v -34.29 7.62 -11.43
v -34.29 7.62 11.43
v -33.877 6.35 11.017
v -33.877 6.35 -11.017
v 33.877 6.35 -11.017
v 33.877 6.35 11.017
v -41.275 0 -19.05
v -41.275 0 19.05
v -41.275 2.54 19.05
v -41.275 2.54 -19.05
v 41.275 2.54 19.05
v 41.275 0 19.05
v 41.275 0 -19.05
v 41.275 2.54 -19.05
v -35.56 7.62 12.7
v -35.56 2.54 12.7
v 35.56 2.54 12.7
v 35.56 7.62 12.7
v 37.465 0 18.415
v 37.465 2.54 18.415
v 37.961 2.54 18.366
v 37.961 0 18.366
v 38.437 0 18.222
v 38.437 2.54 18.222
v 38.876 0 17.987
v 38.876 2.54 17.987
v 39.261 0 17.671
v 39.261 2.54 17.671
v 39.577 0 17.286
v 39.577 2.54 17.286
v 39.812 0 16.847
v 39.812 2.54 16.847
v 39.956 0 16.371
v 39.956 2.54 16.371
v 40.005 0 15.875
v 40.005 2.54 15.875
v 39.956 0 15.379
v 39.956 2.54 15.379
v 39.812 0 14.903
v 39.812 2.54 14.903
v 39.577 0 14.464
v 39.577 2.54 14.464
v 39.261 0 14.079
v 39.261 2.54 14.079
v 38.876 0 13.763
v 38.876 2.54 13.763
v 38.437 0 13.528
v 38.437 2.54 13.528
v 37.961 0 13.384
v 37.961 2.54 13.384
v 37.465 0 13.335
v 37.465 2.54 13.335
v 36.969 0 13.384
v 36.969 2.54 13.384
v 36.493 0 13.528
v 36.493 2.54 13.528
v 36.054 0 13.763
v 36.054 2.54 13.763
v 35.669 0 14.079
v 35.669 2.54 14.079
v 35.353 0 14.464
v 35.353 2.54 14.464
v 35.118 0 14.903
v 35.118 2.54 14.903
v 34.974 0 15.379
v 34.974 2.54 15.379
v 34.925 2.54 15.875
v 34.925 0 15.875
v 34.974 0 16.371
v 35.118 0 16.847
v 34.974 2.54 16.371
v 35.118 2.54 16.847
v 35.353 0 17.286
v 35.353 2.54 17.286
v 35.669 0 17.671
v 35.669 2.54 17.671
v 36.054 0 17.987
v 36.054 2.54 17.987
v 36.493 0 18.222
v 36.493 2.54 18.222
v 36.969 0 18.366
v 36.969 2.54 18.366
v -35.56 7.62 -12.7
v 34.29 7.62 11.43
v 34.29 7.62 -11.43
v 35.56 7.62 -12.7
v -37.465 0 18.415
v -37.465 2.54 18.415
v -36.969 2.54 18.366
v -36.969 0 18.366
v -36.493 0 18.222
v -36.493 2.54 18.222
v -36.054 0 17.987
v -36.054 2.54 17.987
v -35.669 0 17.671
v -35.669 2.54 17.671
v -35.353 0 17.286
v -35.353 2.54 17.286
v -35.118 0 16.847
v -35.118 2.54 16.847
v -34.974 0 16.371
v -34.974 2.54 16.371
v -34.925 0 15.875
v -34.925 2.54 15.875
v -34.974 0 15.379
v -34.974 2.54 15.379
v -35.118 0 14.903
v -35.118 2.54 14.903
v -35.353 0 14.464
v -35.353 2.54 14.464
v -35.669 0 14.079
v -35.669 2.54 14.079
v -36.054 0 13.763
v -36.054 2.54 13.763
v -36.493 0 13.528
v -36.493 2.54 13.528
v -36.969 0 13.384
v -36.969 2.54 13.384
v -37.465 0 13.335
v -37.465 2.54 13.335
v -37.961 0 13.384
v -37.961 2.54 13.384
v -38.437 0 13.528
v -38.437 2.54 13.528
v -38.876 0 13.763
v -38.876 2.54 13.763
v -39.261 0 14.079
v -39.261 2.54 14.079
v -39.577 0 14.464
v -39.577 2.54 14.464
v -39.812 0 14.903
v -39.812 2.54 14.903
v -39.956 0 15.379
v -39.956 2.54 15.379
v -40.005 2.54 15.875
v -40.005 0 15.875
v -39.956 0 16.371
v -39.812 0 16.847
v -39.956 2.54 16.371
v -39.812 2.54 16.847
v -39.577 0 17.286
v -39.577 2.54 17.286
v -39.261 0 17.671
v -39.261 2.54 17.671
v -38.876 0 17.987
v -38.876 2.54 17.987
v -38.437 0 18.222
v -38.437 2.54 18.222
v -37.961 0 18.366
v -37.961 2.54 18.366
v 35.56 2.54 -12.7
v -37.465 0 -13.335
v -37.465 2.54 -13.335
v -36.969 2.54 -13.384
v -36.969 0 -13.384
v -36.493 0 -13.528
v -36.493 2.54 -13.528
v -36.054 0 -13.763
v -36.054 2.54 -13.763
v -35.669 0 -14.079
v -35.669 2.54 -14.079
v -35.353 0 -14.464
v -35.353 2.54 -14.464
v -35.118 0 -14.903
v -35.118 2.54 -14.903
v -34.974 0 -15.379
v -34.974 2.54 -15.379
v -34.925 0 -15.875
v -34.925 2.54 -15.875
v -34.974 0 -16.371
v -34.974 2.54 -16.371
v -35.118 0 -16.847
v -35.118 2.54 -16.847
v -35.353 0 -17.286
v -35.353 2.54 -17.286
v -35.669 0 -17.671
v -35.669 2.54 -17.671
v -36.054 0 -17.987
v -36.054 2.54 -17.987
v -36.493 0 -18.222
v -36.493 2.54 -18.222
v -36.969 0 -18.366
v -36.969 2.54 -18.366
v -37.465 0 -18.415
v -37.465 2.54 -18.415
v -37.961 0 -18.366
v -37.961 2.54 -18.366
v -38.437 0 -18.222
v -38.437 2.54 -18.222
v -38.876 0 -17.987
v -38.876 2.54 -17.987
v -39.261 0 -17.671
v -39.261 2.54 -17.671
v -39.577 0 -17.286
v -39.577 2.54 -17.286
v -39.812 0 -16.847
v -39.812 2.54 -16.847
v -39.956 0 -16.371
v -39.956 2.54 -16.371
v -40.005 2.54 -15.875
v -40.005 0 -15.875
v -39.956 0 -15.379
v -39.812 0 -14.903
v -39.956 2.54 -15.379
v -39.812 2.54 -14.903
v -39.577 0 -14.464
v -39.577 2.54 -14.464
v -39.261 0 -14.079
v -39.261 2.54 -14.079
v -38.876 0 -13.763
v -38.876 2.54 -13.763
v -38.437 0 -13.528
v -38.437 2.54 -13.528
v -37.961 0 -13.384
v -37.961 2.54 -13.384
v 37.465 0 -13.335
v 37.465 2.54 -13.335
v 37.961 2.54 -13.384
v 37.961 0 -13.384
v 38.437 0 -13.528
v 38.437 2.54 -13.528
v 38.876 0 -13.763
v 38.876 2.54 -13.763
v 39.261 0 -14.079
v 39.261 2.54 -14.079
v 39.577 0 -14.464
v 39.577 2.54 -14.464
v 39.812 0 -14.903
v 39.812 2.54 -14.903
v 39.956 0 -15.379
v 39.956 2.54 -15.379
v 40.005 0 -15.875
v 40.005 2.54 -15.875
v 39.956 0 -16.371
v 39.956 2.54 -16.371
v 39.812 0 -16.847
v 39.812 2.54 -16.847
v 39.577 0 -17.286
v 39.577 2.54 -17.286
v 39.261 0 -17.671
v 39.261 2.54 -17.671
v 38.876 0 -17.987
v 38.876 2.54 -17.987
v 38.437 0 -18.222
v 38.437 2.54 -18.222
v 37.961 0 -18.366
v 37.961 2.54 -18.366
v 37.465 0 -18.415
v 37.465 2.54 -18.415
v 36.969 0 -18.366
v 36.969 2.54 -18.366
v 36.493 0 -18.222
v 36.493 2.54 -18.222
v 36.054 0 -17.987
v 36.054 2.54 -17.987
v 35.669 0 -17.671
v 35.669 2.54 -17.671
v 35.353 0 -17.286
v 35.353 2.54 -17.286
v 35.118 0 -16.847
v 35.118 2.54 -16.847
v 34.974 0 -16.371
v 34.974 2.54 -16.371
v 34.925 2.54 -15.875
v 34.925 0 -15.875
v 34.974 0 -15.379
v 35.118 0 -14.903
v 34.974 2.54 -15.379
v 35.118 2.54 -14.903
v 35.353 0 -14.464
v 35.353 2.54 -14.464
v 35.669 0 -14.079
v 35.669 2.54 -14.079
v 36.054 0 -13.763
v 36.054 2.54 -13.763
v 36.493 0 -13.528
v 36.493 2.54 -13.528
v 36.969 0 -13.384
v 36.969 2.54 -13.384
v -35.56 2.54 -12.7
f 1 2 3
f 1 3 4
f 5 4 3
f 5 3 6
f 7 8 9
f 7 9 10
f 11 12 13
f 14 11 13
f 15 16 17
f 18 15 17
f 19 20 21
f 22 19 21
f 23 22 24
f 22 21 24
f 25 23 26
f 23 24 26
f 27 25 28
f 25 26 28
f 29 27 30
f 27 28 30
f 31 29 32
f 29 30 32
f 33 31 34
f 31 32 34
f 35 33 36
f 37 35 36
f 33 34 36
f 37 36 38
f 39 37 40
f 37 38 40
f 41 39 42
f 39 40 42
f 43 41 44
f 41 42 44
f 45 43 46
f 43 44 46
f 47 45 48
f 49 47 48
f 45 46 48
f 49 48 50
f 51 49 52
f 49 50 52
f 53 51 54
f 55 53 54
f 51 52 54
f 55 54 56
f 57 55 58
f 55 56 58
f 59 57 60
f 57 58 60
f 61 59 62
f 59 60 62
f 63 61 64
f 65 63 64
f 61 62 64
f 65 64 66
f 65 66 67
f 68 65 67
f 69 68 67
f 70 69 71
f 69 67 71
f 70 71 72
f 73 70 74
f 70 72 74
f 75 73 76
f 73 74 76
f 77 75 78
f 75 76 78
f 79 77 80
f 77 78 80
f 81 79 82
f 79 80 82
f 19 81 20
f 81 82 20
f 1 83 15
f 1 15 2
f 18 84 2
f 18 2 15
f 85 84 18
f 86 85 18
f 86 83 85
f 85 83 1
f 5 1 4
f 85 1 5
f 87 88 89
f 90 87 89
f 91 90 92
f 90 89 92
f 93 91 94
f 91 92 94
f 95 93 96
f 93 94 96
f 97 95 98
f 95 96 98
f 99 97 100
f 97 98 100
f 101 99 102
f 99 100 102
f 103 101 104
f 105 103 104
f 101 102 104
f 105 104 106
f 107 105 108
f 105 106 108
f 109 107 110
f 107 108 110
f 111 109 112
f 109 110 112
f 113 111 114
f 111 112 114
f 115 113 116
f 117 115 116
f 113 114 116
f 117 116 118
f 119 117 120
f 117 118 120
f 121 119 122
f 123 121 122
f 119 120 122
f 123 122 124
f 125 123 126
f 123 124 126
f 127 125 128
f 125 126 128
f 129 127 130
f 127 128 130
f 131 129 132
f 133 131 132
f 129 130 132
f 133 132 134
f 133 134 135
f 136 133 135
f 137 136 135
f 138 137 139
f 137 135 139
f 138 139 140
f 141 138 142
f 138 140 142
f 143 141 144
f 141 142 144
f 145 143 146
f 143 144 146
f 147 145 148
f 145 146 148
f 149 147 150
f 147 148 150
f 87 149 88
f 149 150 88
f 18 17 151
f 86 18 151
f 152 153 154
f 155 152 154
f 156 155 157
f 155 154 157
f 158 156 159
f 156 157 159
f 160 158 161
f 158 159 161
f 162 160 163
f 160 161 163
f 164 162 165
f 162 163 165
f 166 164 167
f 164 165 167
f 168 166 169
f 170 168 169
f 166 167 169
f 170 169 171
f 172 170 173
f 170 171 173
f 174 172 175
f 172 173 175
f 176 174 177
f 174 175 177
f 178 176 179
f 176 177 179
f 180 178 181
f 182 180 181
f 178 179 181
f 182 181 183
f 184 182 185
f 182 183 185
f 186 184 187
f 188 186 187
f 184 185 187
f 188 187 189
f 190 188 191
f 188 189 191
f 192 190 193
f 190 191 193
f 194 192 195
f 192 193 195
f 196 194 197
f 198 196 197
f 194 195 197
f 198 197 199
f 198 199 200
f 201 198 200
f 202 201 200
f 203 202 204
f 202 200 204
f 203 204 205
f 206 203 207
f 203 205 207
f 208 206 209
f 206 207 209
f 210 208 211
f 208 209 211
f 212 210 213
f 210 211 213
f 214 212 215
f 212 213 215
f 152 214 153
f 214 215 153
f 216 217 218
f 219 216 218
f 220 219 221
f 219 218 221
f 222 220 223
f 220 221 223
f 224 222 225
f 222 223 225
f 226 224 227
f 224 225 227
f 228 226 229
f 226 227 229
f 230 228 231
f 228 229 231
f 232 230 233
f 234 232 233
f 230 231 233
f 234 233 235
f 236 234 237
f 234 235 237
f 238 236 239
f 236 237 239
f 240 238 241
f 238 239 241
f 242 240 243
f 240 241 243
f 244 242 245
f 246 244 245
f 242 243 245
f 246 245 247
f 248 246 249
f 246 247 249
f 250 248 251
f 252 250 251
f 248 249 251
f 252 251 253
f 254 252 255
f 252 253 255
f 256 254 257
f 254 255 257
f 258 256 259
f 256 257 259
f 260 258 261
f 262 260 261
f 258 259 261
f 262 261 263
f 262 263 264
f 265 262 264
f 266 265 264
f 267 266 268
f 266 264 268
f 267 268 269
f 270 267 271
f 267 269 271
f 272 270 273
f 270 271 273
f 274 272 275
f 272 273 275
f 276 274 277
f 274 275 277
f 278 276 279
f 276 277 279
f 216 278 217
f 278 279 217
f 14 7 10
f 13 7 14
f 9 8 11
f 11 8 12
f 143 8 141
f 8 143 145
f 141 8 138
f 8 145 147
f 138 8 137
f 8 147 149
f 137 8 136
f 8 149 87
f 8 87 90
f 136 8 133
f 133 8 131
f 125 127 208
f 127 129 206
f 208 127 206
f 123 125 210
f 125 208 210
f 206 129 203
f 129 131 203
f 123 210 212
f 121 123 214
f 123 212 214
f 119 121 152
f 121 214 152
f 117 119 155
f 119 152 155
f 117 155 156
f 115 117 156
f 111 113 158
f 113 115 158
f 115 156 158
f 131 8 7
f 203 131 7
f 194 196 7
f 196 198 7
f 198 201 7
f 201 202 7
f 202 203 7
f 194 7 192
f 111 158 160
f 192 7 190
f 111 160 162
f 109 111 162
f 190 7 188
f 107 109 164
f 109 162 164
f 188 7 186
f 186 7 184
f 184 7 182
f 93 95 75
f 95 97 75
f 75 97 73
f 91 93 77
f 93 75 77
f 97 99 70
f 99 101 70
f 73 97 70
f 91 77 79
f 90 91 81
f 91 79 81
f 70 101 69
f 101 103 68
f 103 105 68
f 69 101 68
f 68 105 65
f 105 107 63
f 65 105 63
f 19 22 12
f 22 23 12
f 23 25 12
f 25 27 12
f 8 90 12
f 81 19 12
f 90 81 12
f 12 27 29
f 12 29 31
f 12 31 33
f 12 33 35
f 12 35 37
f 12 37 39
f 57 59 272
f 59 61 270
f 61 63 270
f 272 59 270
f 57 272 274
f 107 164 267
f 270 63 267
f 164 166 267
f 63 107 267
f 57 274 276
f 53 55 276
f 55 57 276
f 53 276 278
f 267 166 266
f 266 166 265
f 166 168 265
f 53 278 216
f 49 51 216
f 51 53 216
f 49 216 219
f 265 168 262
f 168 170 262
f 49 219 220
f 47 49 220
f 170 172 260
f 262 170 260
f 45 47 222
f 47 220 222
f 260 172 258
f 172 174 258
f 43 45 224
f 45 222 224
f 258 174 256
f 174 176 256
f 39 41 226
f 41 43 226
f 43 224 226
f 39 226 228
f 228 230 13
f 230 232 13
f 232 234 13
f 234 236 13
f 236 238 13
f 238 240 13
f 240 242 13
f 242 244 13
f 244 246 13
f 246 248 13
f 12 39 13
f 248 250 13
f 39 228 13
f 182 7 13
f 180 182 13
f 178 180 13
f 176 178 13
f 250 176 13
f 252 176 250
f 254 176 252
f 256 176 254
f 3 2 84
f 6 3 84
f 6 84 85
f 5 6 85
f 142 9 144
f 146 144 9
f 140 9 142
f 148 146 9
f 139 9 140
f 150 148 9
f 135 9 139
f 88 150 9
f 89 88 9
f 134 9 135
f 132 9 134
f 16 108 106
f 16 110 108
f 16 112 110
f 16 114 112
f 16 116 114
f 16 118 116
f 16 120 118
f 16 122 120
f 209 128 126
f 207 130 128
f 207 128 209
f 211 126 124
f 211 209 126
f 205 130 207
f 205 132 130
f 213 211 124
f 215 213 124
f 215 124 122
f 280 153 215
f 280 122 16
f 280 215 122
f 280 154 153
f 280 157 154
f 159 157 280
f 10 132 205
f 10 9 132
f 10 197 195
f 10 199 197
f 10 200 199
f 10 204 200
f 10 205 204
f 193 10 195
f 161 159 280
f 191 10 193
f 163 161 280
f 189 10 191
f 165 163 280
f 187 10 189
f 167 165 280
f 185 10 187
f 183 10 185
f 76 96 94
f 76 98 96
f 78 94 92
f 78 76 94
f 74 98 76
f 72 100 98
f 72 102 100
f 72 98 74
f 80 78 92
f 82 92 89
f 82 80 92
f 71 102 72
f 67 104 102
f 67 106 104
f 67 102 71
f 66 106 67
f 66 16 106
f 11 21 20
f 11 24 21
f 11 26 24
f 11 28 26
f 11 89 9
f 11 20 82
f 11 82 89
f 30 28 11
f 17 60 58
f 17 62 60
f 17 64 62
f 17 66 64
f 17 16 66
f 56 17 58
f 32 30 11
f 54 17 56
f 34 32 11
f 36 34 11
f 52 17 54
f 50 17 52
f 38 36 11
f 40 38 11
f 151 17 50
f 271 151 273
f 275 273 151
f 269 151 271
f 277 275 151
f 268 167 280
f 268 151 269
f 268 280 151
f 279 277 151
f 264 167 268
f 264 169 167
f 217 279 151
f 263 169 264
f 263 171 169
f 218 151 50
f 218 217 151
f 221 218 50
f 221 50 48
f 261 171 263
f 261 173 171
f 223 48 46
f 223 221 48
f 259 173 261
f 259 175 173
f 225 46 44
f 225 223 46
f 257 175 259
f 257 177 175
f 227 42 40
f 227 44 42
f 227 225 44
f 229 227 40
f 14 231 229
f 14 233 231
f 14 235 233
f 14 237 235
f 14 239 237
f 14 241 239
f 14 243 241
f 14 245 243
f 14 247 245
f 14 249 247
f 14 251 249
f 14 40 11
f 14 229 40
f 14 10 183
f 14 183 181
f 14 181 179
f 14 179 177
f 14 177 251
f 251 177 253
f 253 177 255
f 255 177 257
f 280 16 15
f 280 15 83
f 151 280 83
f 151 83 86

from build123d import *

# Parameters (mm, degrees)
SKETCH2_W           = 82.55
SKETCH2_H           = 38.1
BOSS_EXTRUDE1_DEPTH = 2.54
SKETCH3_W           = 71.12
SKETCH3_H           = 25.4
BOSS_EXTRUDE2_DEPTH = 5.08
SKETCH4_W           = 68.58
SKETCH4_H           = 22.86
CUT_EXTRUDE1_DEPTH  = 1.27
CUT_EXTRUDE1_DRAFT  = -18
SKETCH5_R           = 2.54
CUT_EXTRUDE2_DEPTH  = 2.54


with BuildPart() as part:
    # Sketch2 → Boss-Extrude1 (new body)
    with BuildSketch(Plane(origin=(0, 0, 0), x_dir=(1, 0, 0), z_dir=(0, 1, 0))):
        Rectangle(SKETCH2_W, SKETCH2_H)
    extrude(amount=BOSS_EXTRUDE1_DEPTH)

    # Sketch3 → Boss-Extrude2 (add)
    with BuildSketch(Plane(origin=(0, 2.54, 0), x_dir=(1, 0, 0), z_dir=(0, 1, 0))):
        Rectangle(SKETCH3_W, SKETCH3_H)
    extrude(amount=BOSS_EXTRUDE2_DEPTH)


with BuildPart() as cut_extrude1_tool:
    # Sketch4 → Cut-Extrude1 (with draft: the straight prism first)
    with BuildSketch(Plane(origin=(0, 7.62, 0), x_dir=(1, 0, 0), z_dir=(0, 1, 0))):
        Rectangle(SKETCH4_W, SKETCH4_H)
    extrude(amount=-CUT_EXTRUDE1_DEPTH)
    # Cut-Extrude1: the draft: its side faces are tilted about the plane it starts from
    cut_extrude1_sides = [cut_extrude1_tool.faces().sort_by_distance(p)[0] for p in [
        (-34.29, 6.985, 0),
        (0, 6.985, 11.43),
        (34.29, 6.985, 0),
        (0, 6.985, -11.43),
    ]]
    draft(cut_extrude1_sides, Plane(origin=(0, 7.62, 0), x_dir=(1, 0, 0), z_dir=(0, 1, 0)), CUT_EXTRUDE1_DRAFT)


with BuildPart() as part_1:
    add(part.part)

    # Cut-Extrude1: cut by cut_extrude1_tool
    add(cut_extrude1_tool.part, mode=Mode.SUBTRACT)

    # Sketch5 → Cut-Extrude2 (cut)
    with BuildSketch(Plane(origin=(0, 2.54, 0), x_dir=(1, 0, 0), z_dir=(0, 1, 0))):
        with Locations((-37.465, 15.875)):
            Circle(SKETCH5_R)
        with Locations((-37.465, -15.875)):
            Circle(SKETCH5_R)
        with Locations((37.465, -15.875)):
            Circle(SKETCH5_R)
        with Locations((37.465, 15.875)):
            Circle(SKETCH5_R)
    extrude(amount=-CUT_EXTRUDE2_DEPTH, mode=Mode.SUBTRACT)


solid = part_1.part
